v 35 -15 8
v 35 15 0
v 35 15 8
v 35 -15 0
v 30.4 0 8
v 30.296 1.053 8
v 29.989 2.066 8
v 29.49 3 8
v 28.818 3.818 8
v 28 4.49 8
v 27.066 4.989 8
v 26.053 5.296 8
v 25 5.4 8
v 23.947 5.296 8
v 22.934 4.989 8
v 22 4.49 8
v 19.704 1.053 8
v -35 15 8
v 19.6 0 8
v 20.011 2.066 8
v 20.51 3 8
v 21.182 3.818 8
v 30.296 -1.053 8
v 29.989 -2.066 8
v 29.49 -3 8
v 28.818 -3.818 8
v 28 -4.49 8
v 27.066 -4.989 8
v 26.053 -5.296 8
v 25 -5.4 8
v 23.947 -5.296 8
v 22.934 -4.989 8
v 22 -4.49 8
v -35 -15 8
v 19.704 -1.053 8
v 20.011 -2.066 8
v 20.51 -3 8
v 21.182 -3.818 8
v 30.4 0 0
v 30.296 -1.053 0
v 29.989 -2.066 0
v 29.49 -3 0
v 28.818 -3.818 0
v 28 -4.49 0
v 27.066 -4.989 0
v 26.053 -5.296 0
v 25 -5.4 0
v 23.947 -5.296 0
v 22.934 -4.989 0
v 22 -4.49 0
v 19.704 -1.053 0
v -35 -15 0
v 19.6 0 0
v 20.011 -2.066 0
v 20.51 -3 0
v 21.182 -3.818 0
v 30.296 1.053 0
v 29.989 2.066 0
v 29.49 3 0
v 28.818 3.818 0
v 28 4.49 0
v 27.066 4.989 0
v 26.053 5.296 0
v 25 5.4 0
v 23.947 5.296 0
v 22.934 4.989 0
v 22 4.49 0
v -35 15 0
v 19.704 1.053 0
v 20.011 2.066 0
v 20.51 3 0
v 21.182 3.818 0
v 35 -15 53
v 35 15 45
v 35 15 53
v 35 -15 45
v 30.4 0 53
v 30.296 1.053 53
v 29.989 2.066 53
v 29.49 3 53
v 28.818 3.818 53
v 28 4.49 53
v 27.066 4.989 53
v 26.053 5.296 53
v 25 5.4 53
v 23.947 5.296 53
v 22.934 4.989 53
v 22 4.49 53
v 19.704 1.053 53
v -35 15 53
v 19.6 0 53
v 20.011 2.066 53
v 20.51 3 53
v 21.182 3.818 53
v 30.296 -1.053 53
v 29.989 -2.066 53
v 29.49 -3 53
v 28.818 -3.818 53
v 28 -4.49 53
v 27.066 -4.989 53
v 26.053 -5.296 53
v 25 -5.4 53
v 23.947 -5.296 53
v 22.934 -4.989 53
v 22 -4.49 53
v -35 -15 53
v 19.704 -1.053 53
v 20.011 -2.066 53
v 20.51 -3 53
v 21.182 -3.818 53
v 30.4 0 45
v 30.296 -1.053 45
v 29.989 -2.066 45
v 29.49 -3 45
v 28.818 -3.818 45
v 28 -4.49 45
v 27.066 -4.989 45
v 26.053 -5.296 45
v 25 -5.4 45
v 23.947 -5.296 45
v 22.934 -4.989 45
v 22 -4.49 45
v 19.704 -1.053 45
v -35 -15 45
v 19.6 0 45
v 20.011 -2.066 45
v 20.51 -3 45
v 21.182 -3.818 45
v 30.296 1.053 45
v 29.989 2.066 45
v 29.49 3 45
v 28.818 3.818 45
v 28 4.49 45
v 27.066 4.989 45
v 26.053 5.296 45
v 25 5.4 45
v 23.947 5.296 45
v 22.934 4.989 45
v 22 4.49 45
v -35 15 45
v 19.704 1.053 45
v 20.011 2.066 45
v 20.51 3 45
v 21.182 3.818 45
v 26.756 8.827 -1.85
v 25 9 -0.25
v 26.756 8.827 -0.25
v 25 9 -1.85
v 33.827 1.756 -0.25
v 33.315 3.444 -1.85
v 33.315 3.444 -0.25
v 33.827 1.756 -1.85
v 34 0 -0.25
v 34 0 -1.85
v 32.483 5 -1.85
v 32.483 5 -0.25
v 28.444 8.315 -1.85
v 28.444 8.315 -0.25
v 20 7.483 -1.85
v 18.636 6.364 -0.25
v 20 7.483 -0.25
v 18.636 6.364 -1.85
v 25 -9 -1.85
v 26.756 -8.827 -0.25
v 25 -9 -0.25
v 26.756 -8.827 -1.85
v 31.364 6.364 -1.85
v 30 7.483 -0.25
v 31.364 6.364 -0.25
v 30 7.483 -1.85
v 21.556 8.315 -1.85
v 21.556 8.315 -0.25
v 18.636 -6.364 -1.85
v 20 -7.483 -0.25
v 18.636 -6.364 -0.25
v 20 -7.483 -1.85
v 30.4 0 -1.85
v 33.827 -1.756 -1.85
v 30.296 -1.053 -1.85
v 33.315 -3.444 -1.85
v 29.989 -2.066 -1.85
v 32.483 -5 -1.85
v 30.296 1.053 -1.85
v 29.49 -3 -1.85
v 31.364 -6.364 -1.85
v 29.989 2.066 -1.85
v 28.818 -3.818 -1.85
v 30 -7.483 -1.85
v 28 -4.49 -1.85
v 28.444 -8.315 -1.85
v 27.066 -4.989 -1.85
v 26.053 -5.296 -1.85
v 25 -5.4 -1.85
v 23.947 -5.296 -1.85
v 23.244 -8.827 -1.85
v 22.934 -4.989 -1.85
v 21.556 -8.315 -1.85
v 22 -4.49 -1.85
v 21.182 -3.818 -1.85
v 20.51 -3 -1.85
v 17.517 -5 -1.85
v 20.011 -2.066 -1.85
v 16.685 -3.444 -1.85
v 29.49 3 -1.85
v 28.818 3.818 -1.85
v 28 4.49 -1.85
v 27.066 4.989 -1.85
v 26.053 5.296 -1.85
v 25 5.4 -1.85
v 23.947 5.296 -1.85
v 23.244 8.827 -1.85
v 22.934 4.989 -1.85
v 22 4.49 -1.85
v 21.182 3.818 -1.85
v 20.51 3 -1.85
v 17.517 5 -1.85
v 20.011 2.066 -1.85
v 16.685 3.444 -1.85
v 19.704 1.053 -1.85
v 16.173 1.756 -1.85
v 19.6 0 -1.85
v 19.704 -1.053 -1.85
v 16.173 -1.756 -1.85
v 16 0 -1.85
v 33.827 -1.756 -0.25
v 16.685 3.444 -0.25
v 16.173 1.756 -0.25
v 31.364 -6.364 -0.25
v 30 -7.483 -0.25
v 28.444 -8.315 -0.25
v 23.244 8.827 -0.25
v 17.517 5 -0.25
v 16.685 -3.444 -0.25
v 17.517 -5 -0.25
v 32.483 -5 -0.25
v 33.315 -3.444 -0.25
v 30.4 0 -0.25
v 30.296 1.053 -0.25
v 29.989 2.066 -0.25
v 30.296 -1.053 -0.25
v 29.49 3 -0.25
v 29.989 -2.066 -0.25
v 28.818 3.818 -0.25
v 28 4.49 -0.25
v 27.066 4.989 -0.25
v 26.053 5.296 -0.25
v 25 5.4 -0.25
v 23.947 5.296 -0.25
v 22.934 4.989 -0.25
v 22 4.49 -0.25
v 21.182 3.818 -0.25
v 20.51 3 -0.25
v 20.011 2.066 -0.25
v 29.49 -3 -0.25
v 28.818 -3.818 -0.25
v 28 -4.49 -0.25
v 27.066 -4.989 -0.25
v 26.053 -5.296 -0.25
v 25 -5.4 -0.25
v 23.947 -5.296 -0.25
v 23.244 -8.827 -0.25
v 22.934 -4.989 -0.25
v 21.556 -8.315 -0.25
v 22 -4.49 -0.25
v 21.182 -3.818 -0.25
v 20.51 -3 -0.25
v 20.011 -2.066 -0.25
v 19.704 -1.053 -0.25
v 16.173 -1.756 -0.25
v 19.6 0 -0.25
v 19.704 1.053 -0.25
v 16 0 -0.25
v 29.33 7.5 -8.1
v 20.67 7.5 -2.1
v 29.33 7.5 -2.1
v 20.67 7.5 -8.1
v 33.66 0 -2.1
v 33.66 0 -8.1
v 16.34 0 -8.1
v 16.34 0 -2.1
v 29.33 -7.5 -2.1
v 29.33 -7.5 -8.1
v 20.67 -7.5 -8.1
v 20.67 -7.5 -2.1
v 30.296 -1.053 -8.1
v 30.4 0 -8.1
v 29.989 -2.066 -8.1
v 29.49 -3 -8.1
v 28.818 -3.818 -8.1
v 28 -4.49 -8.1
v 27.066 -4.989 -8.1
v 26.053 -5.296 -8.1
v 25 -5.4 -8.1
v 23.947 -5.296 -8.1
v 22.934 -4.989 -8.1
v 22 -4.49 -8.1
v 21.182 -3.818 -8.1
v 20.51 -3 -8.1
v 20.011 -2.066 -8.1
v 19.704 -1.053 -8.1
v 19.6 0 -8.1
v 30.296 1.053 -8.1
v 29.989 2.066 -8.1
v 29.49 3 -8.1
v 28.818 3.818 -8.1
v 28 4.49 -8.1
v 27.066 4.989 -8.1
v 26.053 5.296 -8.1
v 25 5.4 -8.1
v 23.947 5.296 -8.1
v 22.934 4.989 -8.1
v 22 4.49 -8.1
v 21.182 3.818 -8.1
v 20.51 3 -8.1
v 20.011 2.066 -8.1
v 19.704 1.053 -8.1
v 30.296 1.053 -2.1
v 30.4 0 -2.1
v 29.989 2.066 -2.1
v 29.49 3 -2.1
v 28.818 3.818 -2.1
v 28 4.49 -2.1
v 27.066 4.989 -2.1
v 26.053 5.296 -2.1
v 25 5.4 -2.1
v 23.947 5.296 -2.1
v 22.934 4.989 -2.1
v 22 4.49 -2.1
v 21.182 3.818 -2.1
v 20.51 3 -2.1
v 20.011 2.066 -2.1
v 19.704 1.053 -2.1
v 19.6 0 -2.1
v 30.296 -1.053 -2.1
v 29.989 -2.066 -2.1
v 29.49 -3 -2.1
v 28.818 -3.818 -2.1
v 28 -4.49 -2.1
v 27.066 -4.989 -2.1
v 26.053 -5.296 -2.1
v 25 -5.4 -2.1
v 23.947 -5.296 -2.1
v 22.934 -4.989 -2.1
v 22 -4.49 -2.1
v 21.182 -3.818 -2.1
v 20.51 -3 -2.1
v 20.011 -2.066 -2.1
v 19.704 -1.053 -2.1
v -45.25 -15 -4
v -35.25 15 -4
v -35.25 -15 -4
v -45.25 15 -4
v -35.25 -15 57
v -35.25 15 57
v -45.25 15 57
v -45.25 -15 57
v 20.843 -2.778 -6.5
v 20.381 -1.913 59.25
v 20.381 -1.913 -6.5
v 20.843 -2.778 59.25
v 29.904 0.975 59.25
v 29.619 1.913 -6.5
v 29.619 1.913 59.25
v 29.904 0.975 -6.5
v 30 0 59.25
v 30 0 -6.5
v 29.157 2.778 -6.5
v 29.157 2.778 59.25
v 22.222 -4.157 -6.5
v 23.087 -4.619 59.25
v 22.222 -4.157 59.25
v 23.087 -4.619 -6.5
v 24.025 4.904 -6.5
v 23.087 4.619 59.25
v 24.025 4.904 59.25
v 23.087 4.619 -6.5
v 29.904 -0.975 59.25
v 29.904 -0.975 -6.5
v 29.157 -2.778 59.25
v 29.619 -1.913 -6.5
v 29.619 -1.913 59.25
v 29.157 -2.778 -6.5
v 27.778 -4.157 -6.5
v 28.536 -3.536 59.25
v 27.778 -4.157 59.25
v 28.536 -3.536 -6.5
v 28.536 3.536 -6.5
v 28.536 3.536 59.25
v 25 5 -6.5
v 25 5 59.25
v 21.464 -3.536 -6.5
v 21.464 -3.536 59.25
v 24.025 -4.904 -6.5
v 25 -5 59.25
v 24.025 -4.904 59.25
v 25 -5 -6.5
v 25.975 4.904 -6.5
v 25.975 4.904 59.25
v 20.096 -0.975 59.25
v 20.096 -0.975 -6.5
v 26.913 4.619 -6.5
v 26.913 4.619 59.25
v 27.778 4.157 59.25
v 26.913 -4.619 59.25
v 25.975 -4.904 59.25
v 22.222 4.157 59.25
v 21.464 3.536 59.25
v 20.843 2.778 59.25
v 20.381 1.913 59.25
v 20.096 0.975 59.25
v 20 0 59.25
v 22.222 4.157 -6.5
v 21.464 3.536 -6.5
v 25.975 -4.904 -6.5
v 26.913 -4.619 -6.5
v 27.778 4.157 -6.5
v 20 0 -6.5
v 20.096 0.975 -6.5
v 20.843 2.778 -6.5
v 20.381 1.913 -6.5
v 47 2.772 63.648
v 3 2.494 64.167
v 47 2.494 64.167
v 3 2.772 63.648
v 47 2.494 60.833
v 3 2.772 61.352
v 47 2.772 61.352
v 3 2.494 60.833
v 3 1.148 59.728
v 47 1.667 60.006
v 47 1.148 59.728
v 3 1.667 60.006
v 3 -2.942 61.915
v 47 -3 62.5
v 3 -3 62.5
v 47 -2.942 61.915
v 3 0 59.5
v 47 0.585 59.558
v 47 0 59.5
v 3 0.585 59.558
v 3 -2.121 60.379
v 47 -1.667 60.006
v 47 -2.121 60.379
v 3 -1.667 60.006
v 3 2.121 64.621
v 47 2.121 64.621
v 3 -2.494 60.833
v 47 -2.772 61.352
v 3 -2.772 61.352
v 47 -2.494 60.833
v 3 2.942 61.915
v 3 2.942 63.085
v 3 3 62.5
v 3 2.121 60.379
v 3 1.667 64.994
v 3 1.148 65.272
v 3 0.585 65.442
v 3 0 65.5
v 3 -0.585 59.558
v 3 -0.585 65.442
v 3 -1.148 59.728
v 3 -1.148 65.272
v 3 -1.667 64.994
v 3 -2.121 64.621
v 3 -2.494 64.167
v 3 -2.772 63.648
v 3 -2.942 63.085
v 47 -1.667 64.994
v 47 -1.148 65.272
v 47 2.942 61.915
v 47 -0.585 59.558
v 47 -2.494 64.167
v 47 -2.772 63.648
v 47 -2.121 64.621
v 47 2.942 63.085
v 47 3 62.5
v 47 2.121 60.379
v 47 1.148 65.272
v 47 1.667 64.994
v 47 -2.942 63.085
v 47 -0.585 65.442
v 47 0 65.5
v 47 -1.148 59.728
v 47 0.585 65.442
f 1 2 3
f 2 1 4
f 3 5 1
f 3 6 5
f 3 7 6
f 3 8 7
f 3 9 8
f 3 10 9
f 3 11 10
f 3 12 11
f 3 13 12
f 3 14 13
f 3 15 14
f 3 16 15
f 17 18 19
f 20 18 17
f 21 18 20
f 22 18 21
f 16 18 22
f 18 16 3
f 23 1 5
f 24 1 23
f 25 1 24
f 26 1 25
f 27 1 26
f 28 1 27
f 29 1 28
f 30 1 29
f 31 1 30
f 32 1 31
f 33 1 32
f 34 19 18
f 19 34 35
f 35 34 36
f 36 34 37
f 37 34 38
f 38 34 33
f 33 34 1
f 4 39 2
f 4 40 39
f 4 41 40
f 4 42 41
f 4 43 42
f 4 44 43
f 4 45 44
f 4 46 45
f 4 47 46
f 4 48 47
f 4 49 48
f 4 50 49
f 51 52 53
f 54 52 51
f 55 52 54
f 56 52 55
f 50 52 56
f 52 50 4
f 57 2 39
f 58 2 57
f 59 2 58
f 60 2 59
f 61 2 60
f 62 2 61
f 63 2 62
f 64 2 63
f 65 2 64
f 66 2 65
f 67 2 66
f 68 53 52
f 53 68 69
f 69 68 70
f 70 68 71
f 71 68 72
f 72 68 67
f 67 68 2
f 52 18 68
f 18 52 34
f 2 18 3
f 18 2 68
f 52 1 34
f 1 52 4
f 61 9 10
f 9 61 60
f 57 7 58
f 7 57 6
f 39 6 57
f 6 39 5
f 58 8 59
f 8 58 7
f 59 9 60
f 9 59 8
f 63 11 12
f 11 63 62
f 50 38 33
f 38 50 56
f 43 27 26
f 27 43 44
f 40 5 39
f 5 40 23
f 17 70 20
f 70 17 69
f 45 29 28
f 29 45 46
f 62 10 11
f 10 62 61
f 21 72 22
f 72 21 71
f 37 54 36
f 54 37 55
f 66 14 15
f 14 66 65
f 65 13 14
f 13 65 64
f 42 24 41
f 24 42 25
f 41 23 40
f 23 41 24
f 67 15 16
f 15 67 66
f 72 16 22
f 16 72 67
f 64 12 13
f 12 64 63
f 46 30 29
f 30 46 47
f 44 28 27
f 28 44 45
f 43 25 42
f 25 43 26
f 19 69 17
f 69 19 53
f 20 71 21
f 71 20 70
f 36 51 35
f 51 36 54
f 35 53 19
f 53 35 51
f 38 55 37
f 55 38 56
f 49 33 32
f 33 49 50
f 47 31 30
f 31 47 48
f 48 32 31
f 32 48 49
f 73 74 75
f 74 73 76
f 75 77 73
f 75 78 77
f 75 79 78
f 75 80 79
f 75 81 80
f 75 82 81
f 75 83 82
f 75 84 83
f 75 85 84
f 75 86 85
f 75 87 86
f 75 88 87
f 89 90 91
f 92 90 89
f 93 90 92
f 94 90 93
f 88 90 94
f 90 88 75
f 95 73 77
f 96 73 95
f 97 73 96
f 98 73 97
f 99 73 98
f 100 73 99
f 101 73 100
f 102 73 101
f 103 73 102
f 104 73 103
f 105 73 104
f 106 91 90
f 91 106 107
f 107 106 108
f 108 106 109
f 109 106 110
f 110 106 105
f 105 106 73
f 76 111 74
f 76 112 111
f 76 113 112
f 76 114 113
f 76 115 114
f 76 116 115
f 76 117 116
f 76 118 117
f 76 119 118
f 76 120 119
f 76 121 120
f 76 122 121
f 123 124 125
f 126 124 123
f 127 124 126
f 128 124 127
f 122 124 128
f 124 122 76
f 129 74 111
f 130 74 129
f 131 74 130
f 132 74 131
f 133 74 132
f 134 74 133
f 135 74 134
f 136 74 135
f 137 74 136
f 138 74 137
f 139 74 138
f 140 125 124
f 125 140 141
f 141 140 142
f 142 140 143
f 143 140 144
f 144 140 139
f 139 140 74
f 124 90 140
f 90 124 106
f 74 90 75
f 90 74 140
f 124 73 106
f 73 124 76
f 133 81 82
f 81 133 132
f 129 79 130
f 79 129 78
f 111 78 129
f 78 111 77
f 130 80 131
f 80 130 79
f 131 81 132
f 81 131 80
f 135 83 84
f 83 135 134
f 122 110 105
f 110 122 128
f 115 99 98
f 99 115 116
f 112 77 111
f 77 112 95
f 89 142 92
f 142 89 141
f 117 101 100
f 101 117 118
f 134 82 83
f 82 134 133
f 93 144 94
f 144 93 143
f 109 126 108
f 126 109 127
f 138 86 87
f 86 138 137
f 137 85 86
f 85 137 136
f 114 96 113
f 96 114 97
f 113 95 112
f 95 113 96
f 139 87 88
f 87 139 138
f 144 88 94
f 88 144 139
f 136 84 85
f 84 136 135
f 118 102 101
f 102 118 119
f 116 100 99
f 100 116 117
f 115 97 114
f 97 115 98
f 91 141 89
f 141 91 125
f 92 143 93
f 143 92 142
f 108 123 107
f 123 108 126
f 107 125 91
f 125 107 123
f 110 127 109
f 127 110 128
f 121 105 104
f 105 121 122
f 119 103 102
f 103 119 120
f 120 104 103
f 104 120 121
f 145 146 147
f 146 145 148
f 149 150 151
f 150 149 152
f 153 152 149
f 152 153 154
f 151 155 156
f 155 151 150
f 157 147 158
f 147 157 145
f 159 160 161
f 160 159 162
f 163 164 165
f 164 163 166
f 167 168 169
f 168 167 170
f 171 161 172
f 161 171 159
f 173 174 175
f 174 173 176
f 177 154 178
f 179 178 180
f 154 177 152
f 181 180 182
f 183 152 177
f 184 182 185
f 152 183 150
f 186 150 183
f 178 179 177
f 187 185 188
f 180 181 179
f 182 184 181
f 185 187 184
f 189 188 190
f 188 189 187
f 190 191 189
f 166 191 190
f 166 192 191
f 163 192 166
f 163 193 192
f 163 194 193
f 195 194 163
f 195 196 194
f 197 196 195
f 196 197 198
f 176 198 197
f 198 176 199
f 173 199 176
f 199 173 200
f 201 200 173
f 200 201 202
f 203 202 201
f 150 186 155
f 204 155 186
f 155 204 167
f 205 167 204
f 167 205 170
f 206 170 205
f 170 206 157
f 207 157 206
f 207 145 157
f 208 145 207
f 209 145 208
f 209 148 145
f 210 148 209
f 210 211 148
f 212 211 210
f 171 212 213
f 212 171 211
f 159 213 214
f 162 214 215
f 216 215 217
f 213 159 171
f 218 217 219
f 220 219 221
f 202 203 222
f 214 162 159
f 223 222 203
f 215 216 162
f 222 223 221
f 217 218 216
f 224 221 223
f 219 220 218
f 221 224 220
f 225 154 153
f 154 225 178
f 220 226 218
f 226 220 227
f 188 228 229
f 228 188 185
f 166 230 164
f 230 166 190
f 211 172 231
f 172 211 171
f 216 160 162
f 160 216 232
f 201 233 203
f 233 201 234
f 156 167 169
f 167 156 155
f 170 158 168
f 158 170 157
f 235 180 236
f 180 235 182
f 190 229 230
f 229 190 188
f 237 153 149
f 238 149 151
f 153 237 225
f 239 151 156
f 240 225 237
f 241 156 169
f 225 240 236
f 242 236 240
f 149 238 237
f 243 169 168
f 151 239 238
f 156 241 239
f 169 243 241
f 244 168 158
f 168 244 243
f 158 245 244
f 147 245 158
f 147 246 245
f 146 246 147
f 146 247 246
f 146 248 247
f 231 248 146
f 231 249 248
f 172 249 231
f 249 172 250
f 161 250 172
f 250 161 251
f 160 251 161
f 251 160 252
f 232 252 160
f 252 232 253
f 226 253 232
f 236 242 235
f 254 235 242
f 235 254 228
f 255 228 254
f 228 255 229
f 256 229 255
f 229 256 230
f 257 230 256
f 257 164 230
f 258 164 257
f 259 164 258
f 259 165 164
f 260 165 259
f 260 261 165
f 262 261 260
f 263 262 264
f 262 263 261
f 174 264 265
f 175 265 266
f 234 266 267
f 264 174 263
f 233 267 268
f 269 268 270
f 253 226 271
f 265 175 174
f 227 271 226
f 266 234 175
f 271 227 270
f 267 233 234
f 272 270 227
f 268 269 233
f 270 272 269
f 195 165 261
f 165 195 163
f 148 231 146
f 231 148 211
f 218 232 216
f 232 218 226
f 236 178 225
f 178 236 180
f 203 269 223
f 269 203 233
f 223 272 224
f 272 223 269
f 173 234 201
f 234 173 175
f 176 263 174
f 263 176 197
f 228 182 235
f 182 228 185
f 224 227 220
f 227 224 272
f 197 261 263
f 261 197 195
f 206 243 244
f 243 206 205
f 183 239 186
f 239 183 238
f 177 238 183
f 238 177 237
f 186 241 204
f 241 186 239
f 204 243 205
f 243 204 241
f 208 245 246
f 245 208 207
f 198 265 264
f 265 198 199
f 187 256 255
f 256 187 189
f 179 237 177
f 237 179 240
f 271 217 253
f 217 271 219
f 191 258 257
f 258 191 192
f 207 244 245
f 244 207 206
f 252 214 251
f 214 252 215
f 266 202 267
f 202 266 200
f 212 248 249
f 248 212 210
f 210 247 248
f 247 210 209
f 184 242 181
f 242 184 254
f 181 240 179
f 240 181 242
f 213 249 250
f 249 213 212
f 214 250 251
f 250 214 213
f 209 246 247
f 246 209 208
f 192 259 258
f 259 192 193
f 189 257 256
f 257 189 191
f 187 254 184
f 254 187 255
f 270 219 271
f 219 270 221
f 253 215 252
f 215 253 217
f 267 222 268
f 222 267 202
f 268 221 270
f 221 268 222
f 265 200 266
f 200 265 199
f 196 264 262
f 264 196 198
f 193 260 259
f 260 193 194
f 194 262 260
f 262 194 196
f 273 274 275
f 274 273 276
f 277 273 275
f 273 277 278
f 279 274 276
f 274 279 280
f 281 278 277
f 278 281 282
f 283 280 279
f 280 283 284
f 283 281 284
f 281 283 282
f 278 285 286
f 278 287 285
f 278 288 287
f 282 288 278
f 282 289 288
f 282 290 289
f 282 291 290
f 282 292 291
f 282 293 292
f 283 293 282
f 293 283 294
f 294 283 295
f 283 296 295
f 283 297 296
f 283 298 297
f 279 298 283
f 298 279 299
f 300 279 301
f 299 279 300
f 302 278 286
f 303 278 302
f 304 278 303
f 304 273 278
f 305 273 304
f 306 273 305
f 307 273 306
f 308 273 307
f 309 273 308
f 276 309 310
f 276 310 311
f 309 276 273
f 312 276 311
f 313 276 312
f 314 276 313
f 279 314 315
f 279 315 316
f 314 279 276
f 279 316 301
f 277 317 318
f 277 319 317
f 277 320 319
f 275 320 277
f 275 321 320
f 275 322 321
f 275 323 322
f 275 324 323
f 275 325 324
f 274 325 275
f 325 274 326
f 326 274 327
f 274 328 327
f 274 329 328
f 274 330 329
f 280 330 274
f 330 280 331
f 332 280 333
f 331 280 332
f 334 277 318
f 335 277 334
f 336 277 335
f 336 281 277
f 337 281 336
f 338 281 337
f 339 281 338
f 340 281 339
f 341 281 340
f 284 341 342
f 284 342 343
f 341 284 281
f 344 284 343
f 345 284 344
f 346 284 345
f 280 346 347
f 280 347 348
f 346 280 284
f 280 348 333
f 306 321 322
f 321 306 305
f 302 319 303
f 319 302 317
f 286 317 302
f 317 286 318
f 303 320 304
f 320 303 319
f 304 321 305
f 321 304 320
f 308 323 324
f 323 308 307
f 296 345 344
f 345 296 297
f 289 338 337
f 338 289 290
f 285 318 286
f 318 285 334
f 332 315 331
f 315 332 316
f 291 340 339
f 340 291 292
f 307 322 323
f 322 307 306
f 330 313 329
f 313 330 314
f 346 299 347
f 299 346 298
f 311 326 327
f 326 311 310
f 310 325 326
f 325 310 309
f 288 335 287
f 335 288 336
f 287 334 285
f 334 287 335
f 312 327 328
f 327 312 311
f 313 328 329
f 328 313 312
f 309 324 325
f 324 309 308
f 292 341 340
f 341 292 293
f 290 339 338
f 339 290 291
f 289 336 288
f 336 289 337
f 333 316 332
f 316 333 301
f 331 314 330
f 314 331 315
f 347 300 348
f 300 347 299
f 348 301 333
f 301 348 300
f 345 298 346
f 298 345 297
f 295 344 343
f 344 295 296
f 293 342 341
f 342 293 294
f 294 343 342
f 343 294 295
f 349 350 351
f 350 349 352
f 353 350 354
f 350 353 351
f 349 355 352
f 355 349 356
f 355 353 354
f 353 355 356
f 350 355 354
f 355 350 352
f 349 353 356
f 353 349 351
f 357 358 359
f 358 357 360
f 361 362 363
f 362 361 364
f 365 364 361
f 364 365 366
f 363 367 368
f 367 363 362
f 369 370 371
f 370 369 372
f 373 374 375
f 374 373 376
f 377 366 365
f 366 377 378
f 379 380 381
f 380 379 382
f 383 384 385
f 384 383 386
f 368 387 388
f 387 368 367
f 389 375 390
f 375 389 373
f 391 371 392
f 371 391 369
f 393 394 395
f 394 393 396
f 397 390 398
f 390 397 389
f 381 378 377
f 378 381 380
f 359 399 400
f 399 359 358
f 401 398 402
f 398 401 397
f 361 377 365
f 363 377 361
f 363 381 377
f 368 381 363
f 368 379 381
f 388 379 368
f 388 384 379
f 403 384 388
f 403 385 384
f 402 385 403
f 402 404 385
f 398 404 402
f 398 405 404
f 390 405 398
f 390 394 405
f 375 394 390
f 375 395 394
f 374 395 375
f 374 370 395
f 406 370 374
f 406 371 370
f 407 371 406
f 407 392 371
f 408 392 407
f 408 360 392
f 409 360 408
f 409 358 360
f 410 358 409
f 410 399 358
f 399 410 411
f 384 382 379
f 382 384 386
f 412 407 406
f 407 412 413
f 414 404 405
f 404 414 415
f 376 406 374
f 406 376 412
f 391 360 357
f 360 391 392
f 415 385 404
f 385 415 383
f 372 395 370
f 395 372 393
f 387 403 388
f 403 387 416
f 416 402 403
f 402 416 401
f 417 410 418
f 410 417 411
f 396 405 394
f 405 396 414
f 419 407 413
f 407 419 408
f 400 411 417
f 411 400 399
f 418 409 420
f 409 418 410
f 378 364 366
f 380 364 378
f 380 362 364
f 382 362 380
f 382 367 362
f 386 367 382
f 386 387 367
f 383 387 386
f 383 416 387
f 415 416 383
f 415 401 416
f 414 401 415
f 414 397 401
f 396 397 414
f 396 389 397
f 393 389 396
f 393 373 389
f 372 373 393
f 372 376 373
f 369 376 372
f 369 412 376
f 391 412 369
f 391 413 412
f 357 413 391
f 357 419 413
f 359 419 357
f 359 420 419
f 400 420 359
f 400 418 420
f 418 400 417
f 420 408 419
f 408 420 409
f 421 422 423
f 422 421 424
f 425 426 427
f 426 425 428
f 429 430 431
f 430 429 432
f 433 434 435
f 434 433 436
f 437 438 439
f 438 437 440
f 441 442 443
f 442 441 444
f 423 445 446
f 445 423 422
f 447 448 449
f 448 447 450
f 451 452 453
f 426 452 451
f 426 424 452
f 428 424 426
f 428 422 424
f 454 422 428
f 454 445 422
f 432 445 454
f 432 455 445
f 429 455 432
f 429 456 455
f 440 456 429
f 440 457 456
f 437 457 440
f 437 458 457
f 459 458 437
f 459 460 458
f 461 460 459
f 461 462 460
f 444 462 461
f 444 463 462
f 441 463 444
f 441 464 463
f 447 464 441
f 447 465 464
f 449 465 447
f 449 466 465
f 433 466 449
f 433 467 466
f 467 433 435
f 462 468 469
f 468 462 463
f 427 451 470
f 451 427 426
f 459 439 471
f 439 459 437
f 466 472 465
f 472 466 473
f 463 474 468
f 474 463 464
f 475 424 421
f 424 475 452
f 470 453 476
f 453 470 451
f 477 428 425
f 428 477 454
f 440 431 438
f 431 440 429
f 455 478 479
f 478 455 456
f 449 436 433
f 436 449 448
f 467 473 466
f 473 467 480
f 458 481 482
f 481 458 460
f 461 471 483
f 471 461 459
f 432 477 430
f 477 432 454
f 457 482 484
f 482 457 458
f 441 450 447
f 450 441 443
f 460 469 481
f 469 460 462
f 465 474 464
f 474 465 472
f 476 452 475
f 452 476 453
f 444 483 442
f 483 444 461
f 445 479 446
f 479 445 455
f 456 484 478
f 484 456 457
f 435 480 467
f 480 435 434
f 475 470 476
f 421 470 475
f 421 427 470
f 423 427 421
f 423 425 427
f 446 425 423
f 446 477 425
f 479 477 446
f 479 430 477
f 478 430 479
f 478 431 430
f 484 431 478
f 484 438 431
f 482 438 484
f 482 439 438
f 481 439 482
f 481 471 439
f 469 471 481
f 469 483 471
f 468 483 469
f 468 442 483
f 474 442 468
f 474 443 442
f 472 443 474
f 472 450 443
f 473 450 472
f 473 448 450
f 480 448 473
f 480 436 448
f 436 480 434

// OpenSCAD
$fn = 32;

// ------------------------------------------------------------------------
// C clamp: throat 45 mm, screw d10
// Every part is its own module, assembly() places every instance.
// ------------------------------------------------------------------------

// --- part 1 ---
module clamp_arm() {
  difference() {
    translate([-35, -15, 0]) cube([70, 30, 8]);
    translate([25, 0, -1]) cylinder(h = 10, d = 10.8);
  }
}

// --- part 2 ---
module clamp_spine() {
  difference() {
    translate([-30.5, -15, 0]) cube([61, 30, 10]);
  }
}

// --- part 3 ---
module clamp_screw() {
  translate([0, 0, -32.875]) cylinder(h = 65.75, d = 10);
}

// --- part 4 ---
module clamp_washer() {
  difference() {
      translate([0, 0, 0]) cylinder(h = 1.6, d = 18);
      translate([0, 0, -1]) cylinder(h = 3.6, d = 10.8);
    }
}

// --- part 5 ---
module clamp_nut() {
  difference() {
    linear_extrude(height = 6) polygon(points = [[8.66, 0], [4.33, 7.5], [-4.33, 7.5], [-8.66, 0], [-4.33, -7.5], [4.33, -7.5]]);
    translate([0, 0, -1]) cylinder(h = 8, d = 10.8);
  }
}

// --- part 6 ---
module tommy_bar() {
  translate([0, 0, -22]) cylinder(h = 44, d = 6);
}

// --- assembly ---
module assembly() {
  color([0.80, 0.24, 0.20]) translate([0, 0, 0]) rotate([0, 0, 0]) clamp_arm();
  color([0.20, 0.45, 0.75]) translate([0, 0, 45]) rotate([0, 0, 0]) clamp_arm();
  color([0.25, 0.62, 0.32]) translate([-45.25, 0, 26.5]) rotate([0, 90, 0]) clamp_spine();
  color([0.92, 0.70, 0.18]) translate([25, 0, 26.375]) rotate([0, 0, 0]) clamp_screw();
  color([0.58, 0.35, 0.70]) translate([25, 0, -1.85]) rotate([0, 0, 0]) clamp_washer();
  color([0.16, 0.66, 0.66]) translate([25, 0, -8.1]) rotate([0, 0, 0]) clamp_nut();
  color([0.85, 0.48, 0.18]) translate([25, 0, 62.5]) rotate([0, 90, 0]) tommy_bar();
}

assembly();
